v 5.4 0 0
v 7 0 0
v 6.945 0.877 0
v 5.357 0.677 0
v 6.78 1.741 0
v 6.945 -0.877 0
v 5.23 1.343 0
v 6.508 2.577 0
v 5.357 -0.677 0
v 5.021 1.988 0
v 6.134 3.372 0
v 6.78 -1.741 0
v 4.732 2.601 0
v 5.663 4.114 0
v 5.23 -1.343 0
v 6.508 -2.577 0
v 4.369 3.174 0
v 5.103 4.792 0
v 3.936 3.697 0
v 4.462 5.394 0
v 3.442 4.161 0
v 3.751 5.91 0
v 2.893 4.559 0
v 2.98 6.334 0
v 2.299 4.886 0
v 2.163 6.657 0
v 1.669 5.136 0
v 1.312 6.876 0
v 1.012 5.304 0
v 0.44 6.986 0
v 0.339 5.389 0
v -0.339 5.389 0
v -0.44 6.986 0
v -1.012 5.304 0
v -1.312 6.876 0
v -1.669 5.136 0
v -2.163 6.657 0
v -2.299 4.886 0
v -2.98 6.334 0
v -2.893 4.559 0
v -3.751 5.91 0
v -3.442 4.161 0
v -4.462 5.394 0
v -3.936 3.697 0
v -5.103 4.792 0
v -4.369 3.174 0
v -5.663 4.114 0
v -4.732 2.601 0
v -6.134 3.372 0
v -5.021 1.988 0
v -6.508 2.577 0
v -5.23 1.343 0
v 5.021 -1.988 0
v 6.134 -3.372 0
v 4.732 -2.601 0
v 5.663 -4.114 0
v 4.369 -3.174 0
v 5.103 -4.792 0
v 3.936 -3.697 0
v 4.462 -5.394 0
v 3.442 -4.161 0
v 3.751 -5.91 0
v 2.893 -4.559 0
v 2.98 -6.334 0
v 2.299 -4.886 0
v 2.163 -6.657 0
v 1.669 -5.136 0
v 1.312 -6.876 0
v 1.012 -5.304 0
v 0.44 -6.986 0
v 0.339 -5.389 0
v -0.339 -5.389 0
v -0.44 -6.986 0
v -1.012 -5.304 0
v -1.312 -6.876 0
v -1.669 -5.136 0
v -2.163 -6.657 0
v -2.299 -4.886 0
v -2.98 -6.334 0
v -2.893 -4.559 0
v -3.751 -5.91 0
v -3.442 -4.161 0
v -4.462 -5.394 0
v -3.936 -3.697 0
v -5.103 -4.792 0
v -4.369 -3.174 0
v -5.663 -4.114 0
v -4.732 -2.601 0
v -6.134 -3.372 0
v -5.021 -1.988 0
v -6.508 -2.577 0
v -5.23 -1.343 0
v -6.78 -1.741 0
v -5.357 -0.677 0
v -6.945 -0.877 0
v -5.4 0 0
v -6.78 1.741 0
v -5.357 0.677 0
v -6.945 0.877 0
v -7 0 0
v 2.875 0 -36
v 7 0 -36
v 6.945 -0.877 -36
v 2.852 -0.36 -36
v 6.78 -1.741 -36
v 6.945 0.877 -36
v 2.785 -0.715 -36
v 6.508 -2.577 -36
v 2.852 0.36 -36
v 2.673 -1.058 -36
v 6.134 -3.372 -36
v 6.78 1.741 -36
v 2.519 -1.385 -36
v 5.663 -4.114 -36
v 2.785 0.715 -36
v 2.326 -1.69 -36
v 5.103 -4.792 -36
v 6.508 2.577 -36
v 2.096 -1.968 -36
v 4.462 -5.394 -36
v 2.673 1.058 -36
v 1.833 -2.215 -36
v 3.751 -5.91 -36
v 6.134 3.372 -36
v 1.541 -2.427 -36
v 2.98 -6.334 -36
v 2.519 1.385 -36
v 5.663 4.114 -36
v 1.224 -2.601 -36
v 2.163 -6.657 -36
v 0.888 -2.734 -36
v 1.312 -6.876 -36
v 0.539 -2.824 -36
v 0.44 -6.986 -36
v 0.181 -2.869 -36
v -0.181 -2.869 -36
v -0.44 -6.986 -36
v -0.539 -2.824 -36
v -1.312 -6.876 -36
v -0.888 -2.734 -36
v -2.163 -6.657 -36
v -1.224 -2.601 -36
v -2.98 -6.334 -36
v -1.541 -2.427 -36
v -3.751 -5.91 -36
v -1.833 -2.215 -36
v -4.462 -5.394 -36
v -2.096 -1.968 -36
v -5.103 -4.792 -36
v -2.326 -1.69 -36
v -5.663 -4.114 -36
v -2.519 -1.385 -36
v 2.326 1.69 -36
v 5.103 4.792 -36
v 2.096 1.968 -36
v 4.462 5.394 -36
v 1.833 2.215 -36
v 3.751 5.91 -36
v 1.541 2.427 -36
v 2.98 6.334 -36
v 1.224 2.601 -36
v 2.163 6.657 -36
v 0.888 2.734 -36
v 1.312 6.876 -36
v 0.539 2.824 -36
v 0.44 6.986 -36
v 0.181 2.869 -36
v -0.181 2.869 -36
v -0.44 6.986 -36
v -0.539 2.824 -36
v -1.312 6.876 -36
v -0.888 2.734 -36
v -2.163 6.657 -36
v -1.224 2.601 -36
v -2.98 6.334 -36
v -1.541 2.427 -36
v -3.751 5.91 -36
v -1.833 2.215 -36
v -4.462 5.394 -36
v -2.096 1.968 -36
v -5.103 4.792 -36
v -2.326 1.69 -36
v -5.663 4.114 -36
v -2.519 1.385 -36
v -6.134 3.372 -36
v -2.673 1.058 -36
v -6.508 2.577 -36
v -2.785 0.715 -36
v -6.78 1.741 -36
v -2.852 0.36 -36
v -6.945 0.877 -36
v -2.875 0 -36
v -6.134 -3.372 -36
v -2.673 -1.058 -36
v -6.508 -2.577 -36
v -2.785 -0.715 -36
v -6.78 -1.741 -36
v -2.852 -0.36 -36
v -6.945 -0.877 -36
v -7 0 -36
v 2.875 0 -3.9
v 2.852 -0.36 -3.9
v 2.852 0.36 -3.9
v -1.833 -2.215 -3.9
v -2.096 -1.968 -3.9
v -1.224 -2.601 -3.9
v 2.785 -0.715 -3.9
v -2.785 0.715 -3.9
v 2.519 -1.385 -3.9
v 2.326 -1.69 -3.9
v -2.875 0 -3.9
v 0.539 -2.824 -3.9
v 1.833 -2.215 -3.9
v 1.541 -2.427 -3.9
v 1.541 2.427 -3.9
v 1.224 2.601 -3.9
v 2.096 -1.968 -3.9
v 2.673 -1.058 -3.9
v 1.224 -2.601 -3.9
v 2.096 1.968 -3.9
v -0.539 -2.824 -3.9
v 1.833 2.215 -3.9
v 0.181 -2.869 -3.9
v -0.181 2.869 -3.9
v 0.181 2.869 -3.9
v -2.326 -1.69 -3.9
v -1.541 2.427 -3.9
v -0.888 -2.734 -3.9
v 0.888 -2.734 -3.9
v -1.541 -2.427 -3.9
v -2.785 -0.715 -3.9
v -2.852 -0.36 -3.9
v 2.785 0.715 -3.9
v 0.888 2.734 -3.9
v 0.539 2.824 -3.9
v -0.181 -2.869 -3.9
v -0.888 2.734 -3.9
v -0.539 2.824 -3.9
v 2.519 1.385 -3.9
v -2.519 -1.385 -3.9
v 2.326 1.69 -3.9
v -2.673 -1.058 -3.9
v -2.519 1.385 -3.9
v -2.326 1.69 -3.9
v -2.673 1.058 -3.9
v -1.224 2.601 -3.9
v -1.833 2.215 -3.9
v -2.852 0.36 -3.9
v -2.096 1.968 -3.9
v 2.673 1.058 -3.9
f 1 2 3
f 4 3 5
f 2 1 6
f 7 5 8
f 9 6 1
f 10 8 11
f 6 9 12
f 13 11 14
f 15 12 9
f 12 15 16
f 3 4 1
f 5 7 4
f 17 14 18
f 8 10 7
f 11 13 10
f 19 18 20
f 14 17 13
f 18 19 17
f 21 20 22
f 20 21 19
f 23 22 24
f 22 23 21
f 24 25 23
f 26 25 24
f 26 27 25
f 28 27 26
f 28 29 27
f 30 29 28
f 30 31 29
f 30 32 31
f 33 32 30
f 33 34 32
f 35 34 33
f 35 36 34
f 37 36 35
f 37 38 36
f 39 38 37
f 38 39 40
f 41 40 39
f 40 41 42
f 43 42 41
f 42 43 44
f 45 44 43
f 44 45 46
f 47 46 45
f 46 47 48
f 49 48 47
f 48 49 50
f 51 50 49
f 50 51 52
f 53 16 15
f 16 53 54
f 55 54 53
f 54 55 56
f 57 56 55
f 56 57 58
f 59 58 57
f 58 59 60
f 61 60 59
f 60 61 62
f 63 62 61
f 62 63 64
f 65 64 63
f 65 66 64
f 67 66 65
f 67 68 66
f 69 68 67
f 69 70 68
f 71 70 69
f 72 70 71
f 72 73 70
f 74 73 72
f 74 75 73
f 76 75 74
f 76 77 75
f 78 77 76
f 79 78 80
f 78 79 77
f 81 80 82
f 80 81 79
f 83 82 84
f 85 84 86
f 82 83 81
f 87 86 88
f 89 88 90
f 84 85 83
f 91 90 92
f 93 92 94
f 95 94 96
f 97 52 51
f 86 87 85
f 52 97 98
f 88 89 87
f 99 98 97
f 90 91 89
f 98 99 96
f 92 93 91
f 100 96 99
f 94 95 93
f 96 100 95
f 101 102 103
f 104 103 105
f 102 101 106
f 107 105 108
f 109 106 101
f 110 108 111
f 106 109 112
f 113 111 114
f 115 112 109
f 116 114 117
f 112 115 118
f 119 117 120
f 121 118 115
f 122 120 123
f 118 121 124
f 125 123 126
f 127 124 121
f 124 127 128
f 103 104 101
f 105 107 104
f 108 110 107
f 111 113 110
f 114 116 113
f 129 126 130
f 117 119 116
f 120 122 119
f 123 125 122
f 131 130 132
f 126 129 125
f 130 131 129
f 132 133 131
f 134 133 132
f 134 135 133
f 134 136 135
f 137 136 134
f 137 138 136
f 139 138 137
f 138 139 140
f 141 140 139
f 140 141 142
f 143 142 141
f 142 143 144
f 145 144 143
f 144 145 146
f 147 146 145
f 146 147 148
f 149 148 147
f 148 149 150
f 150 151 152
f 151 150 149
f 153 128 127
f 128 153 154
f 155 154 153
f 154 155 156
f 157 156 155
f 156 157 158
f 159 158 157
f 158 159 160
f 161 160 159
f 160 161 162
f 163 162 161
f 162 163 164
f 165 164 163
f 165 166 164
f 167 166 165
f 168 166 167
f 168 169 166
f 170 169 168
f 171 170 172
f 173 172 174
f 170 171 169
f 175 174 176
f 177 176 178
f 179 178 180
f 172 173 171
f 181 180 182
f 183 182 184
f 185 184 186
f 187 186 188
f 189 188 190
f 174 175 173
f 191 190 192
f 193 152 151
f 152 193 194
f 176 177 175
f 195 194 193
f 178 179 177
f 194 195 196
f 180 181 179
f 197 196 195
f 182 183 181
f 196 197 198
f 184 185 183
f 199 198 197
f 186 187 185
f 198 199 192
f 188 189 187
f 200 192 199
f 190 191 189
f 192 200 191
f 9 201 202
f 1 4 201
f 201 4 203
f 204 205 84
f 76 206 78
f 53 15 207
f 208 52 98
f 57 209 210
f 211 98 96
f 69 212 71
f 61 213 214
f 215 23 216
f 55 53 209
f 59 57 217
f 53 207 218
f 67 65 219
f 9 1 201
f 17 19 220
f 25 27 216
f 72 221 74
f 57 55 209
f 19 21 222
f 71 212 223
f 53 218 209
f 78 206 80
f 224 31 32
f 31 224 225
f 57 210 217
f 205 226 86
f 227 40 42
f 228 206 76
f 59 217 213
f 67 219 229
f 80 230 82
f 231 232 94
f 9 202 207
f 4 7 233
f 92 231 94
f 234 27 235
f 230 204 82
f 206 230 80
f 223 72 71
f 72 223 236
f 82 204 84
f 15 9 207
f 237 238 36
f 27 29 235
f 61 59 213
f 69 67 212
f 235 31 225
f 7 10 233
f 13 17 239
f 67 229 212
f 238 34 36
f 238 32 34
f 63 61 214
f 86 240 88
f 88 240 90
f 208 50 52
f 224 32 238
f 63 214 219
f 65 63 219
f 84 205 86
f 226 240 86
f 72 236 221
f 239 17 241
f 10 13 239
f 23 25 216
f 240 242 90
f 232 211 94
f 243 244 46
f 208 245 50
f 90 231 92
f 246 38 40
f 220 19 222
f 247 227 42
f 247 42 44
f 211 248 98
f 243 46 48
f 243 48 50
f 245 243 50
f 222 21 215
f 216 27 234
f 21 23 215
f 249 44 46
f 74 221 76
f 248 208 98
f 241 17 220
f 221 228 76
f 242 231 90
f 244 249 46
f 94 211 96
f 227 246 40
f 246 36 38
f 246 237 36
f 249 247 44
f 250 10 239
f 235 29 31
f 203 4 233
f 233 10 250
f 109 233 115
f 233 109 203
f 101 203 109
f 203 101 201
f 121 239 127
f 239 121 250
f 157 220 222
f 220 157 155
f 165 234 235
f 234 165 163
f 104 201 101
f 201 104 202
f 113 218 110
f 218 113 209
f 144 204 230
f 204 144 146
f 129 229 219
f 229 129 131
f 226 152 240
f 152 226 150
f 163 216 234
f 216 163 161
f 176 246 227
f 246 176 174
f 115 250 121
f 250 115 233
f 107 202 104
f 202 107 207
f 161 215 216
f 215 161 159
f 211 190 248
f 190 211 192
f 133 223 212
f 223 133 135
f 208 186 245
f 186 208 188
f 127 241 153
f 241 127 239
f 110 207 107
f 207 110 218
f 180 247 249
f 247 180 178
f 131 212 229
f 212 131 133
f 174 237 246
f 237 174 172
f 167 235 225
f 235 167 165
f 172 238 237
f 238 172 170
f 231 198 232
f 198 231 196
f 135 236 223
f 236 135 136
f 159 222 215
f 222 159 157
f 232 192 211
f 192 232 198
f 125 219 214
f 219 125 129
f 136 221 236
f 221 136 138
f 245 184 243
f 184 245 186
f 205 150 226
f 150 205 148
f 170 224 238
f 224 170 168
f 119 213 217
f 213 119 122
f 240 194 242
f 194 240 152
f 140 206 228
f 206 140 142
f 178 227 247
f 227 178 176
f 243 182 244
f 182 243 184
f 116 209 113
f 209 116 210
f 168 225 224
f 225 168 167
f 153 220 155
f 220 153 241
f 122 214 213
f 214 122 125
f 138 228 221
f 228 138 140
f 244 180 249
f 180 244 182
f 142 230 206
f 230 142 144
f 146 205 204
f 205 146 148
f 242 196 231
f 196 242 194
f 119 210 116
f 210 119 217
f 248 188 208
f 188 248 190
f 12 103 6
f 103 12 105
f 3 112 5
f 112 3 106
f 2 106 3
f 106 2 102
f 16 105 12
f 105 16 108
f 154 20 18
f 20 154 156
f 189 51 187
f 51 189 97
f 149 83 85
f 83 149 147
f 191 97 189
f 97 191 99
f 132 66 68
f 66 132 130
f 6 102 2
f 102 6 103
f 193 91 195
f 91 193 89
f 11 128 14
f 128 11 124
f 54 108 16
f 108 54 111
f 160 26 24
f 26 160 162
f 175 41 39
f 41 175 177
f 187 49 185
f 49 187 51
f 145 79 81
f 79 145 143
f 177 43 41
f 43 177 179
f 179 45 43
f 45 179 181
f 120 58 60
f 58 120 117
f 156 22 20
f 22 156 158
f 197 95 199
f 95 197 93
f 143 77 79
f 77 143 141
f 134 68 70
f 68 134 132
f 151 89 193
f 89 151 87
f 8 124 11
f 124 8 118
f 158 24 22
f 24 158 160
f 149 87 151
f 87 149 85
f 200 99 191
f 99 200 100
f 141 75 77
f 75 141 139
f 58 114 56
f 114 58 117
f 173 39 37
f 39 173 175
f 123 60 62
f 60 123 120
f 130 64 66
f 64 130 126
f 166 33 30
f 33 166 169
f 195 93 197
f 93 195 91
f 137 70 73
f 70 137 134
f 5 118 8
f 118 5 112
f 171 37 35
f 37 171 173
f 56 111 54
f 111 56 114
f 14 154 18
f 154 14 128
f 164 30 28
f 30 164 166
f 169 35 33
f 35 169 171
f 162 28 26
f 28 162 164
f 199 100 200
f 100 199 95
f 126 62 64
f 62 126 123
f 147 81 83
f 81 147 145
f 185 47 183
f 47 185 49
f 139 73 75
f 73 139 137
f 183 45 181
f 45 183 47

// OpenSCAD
$fn = 50;


difference() {
	union() {
		translate(v = [0, 0, -36.0000000000]) {
			cylinder(h = 36, r = 7.0000000000);
		}
		cylinder(h = 0, r = 10.0000000000);
	}
	union() {
		translate(v = [0, 0, 0]) {
			rotate(a = [0, 0, 0]) {
				difference() {
					union() {
						#translate(v = [0, 0, -36.0000000000]) {
							cylinder(h = 36, r = 2.6000000000);
						}
						#translate(v = [0, 0, -3.9000000000]) {
							cylinder(h = 3.9000000000, r = 7.0000000000, r1 = 2.8750000000, r2 = 5.4000000000);
						}
						#translate(v = [0, 0, -36.0000000000]) {
							cylinder(h = 36, r = 2.8750000000);
						}
						#translate(v = [0, 0, -36.0000000000]) {
							cylinder(h = 36, r = 2.6000000000);
						}
					}
					union();
				}
			}
		}
	}
}
